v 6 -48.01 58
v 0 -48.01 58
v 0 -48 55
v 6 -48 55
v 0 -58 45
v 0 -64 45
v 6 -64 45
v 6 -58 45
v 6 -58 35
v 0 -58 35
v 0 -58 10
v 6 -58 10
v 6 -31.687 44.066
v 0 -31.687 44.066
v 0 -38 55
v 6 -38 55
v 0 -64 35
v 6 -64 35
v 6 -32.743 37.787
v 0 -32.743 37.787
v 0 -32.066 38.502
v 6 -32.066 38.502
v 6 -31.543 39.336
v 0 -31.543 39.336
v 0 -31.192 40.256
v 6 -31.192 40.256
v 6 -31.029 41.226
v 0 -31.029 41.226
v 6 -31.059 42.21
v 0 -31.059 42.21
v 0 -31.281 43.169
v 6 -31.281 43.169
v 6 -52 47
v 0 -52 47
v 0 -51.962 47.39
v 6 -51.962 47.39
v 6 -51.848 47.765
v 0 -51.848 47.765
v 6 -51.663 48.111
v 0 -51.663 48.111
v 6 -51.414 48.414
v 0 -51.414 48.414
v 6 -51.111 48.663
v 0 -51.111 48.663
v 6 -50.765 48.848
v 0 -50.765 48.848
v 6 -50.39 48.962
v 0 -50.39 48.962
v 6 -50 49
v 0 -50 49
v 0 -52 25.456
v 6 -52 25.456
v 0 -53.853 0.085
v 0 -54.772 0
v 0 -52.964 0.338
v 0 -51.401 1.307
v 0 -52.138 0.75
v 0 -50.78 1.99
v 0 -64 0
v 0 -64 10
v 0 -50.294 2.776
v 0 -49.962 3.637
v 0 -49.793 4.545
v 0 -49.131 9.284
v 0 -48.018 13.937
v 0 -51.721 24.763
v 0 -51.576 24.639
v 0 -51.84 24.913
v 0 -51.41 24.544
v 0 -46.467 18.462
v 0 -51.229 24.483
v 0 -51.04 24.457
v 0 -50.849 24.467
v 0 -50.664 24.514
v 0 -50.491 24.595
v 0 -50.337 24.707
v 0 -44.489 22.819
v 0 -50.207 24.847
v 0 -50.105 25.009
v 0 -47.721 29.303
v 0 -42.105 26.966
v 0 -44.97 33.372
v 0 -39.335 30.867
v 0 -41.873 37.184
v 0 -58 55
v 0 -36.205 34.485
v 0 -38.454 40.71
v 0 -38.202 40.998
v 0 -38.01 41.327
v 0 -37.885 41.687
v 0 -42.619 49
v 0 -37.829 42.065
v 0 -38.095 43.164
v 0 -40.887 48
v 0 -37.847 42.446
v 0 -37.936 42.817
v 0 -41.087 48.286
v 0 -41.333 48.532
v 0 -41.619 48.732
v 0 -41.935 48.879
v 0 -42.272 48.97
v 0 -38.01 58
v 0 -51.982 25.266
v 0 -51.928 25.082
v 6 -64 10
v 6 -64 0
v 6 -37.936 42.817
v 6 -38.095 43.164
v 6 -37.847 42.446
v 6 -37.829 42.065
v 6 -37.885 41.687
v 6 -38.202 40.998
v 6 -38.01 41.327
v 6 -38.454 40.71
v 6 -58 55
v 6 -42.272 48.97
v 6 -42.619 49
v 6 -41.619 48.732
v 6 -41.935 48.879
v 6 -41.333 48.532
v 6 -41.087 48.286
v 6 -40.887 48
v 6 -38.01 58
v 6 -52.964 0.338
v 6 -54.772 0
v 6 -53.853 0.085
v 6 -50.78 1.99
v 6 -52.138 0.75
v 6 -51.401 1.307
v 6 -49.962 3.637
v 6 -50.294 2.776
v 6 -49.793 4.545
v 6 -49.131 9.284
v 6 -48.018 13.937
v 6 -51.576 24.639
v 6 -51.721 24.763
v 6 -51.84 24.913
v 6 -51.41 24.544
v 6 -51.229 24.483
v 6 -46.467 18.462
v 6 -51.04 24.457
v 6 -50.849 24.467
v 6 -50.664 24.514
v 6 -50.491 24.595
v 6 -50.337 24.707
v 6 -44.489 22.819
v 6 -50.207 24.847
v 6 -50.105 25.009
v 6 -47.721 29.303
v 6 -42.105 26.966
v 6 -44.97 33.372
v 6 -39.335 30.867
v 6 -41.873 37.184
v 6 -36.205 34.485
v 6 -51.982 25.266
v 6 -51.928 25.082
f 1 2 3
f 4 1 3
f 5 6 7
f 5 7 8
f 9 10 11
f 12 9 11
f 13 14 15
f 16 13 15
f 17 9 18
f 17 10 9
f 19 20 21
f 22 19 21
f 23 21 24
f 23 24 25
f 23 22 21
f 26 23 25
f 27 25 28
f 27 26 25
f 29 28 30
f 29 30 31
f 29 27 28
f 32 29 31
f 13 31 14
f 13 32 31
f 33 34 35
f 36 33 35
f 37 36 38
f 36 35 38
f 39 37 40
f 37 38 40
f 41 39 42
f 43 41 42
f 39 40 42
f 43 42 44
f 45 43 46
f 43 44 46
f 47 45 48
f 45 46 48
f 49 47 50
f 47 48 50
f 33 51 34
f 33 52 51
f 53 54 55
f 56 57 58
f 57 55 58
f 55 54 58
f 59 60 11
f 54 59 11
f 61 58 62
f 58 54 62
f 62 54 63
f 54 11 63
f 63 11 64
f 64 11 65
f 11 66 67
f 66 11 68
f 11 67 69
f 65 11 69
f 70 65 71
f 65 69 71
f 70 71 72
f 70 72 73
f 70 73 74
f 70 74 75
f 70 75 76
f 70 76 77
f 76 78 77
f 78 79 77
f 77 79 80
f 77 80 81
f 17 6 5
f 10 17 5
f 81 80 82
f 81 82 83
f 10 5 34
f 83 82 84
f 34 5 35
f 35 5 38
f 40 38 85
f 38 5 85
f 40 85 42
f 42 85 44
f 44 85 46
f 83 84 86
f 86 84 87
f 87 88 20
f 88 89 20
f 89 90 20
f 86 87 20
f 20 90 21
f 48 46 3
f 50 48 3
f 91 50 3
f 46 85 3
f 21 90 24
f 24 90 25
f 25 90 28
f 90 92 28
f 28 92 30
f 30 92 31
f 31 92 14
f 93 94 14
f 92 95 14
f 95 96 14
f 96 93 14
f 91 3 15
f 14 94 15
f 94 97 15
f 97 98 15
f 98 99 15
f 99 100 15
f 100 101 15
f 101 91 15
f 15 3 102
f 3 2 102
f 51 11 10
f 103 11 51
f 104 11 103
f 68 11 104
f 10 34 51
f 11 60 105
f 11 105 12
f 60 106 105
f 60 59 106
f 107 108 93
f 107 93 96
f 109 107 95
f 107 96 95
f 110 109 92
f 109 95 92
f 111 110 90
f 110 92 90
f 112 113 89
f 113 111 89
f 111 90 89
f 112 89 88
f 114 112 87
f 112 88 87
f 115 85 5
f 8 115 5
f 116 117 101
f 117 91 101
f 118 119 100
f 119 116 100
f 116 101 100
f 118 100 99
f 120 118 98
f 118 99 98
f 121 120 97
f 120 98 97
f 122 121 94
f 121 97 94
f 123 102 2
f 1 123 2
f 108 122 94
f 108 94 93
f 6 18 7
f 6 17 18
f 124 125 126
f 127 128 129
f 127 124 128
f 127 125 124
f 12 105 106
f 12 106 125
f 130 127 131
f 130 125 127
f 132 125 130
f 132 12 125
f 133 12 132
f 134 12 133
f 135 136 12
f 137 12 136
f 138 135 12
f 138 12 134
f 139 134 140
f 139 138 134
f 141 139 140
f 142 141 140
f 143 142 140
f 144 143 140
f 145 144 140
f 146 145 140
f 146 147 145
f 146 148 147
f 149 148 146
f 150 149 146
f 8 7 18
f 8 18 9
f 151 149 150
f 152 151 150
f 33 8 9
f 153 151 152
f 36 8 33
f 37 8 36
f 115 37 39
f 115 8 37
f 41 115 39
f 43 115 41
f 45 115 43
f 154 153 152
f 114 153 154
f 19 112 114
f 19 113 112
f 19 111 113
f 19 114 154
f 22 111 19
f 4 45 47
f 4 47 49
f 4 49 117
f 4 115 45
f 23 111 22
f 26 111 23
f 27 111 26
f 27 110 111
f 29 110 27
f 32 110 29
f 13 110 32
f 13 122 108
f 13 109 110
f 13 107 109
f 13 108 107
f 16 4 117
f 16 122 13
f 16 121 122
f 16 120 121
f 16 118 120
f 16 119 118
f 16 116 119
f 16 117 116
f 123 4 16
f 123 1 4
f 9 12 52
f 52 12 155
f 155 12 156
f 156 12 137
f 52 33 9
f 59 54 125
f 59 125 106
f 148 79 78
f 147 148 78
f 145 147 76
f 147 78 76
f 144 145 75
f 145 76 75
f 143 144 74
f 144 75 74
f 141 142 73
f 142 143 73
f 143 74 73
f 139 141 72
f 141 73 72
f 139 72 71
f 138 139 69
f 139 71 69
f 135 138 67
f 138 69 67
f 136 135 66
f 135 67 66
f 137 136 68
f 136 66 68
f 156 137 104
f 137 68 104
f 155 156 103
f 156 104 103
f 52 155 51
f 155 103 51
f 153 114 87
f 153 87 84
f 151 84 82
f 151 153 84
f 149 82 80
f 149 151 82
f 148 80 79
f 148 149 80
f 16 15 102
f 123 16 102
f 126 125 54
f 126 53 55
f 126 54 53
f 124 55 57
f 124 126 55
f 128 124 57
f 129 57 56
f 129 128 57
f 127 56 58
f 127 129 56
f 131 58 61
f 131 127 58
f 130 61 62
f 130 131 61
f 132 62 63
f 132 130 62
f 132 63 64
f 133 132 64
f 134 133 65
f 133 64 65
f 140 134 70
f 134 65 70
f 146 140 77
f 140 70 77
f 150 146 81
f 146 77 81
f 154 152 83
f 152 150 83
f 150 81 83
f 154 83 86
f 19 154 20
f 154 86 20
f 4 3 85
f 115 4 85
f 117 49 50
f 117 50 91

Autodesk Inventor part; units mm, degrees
ref_plane "YZ Plane" through (0, 0, 0) normal (1, 0, 0) x (0, 1, 0)
ref_plane "XZ Plane" through (0, 0, 0) normal (0, 1, 0) x (-1, 0, 0)
ref_plane "XY Plane" through (0, 0, 0) normal (0, 0, 1) x (1, 0, 0)
sketch "Sketch1" plane through (0, 0, 0) normal (1, 0, 0) x (0, 1, 0)
  line L0 (-29.5376, 40.3427) -> (-38, 55)
  circle A0 centre (0, 0) radius 50 construction
  line L1 (-38, 55) -> (-38.0101, 58)
  line L2 (-38.0101, 58) -> (-48.0101, 58)
  line L3 (-48.0101, 58) -> (-48, 55)
  line L4 (-58, 35) -> (-64, 35)
  line L5 (-64, 35) -> (-64, 45)
  line L6 (-64, 45) -> (-58, 45)
  arc A1 (-42.0654, 27.0278) -> (-29.5376, 40.3427) centre (0, 0) ccw construction
  line L7 (-58, 55) -> (-58, 45)
  line L8 (-38, 55) -> (-38, 55)
  line L9 (-48, 55) -> (-58, 55)
  line L10 (-58, 55) -> (-36.8235, 33.8235) construction
  line L11 (-50, 0) -> (-57.2434, 0)
  line L12 (-57.2434, 0) -> (-64, 0)
  line L13 (-64, 0) -> (-64, 10)
  line L14 (-64, 10) -> (-58, 10)
  line L15 (-58, 35) -> (-58, 10)
  arc A2 (-29.5376, 40.3427) -> (-50, 0) centre (0, 0) ccw
  point P0 (-30.8961, 39.312)
  dimension "d6" = 50
  dimension "d8" = 10
  dimension "d10" = 3
  dimension "d11" = 10
  dimension "d12" = 6
  dimension "d17" = 120
  dimension "d18" = 10
  dimension "d19" = 5
  dimension "d21" = 10
  dimension "d23" = 45
  dimension "d25" = 15
  dimension "d26" = 0
  dimension "d30" = 10
  dimension "d31" = 6
  dimension "d32" = 25
  dimension "d38" = 58
extrude "Extrusion2" add sketch "Sketch1" along normal blind 6
fillet "Fillet3" radius 5 2 edges at (3, -29.5376, 40.3427) (3, -50, 0)
sketch "Sketch2" plane through (6, 0, 0) normal (1, 0, 0) x (0, 0, -1)
  arc A0 (-41.7758, -37.2932) -> (-20.7846, -52) centre (0, 0) ccw
  line L0 (-20.7846, -52) -> (-49, -52)
  line L1 (-49, -52) -> (-49, -41.4641)
  line L2 (-49, -41.4641) -> (-41.7758, -37.2932)
  line L3 (-44.0661, -31.6873) -> (-55, -38) projected
  line L4 (-55, -48) -> (-55, -58) projected
  line L5 (-55, -58) -> (-45, -58) projected
  dimension "d42" = 6
  dimension "d43" = 6
  dimension "d44" = 6
  dimension "d45" = 56
extrude "Extrusion3" cut sketch "Sketch2" against normal through all
fillet "Fillet4" radius 1 1 edges at (3, -52, 20.7846)
fillet "Fillet5" radius 2 3 edges at (3, -52, 49) (3, -41.4641, 49) (3, -37.2932, 41.7758)
properties part number "HarnessPusher27021014"
